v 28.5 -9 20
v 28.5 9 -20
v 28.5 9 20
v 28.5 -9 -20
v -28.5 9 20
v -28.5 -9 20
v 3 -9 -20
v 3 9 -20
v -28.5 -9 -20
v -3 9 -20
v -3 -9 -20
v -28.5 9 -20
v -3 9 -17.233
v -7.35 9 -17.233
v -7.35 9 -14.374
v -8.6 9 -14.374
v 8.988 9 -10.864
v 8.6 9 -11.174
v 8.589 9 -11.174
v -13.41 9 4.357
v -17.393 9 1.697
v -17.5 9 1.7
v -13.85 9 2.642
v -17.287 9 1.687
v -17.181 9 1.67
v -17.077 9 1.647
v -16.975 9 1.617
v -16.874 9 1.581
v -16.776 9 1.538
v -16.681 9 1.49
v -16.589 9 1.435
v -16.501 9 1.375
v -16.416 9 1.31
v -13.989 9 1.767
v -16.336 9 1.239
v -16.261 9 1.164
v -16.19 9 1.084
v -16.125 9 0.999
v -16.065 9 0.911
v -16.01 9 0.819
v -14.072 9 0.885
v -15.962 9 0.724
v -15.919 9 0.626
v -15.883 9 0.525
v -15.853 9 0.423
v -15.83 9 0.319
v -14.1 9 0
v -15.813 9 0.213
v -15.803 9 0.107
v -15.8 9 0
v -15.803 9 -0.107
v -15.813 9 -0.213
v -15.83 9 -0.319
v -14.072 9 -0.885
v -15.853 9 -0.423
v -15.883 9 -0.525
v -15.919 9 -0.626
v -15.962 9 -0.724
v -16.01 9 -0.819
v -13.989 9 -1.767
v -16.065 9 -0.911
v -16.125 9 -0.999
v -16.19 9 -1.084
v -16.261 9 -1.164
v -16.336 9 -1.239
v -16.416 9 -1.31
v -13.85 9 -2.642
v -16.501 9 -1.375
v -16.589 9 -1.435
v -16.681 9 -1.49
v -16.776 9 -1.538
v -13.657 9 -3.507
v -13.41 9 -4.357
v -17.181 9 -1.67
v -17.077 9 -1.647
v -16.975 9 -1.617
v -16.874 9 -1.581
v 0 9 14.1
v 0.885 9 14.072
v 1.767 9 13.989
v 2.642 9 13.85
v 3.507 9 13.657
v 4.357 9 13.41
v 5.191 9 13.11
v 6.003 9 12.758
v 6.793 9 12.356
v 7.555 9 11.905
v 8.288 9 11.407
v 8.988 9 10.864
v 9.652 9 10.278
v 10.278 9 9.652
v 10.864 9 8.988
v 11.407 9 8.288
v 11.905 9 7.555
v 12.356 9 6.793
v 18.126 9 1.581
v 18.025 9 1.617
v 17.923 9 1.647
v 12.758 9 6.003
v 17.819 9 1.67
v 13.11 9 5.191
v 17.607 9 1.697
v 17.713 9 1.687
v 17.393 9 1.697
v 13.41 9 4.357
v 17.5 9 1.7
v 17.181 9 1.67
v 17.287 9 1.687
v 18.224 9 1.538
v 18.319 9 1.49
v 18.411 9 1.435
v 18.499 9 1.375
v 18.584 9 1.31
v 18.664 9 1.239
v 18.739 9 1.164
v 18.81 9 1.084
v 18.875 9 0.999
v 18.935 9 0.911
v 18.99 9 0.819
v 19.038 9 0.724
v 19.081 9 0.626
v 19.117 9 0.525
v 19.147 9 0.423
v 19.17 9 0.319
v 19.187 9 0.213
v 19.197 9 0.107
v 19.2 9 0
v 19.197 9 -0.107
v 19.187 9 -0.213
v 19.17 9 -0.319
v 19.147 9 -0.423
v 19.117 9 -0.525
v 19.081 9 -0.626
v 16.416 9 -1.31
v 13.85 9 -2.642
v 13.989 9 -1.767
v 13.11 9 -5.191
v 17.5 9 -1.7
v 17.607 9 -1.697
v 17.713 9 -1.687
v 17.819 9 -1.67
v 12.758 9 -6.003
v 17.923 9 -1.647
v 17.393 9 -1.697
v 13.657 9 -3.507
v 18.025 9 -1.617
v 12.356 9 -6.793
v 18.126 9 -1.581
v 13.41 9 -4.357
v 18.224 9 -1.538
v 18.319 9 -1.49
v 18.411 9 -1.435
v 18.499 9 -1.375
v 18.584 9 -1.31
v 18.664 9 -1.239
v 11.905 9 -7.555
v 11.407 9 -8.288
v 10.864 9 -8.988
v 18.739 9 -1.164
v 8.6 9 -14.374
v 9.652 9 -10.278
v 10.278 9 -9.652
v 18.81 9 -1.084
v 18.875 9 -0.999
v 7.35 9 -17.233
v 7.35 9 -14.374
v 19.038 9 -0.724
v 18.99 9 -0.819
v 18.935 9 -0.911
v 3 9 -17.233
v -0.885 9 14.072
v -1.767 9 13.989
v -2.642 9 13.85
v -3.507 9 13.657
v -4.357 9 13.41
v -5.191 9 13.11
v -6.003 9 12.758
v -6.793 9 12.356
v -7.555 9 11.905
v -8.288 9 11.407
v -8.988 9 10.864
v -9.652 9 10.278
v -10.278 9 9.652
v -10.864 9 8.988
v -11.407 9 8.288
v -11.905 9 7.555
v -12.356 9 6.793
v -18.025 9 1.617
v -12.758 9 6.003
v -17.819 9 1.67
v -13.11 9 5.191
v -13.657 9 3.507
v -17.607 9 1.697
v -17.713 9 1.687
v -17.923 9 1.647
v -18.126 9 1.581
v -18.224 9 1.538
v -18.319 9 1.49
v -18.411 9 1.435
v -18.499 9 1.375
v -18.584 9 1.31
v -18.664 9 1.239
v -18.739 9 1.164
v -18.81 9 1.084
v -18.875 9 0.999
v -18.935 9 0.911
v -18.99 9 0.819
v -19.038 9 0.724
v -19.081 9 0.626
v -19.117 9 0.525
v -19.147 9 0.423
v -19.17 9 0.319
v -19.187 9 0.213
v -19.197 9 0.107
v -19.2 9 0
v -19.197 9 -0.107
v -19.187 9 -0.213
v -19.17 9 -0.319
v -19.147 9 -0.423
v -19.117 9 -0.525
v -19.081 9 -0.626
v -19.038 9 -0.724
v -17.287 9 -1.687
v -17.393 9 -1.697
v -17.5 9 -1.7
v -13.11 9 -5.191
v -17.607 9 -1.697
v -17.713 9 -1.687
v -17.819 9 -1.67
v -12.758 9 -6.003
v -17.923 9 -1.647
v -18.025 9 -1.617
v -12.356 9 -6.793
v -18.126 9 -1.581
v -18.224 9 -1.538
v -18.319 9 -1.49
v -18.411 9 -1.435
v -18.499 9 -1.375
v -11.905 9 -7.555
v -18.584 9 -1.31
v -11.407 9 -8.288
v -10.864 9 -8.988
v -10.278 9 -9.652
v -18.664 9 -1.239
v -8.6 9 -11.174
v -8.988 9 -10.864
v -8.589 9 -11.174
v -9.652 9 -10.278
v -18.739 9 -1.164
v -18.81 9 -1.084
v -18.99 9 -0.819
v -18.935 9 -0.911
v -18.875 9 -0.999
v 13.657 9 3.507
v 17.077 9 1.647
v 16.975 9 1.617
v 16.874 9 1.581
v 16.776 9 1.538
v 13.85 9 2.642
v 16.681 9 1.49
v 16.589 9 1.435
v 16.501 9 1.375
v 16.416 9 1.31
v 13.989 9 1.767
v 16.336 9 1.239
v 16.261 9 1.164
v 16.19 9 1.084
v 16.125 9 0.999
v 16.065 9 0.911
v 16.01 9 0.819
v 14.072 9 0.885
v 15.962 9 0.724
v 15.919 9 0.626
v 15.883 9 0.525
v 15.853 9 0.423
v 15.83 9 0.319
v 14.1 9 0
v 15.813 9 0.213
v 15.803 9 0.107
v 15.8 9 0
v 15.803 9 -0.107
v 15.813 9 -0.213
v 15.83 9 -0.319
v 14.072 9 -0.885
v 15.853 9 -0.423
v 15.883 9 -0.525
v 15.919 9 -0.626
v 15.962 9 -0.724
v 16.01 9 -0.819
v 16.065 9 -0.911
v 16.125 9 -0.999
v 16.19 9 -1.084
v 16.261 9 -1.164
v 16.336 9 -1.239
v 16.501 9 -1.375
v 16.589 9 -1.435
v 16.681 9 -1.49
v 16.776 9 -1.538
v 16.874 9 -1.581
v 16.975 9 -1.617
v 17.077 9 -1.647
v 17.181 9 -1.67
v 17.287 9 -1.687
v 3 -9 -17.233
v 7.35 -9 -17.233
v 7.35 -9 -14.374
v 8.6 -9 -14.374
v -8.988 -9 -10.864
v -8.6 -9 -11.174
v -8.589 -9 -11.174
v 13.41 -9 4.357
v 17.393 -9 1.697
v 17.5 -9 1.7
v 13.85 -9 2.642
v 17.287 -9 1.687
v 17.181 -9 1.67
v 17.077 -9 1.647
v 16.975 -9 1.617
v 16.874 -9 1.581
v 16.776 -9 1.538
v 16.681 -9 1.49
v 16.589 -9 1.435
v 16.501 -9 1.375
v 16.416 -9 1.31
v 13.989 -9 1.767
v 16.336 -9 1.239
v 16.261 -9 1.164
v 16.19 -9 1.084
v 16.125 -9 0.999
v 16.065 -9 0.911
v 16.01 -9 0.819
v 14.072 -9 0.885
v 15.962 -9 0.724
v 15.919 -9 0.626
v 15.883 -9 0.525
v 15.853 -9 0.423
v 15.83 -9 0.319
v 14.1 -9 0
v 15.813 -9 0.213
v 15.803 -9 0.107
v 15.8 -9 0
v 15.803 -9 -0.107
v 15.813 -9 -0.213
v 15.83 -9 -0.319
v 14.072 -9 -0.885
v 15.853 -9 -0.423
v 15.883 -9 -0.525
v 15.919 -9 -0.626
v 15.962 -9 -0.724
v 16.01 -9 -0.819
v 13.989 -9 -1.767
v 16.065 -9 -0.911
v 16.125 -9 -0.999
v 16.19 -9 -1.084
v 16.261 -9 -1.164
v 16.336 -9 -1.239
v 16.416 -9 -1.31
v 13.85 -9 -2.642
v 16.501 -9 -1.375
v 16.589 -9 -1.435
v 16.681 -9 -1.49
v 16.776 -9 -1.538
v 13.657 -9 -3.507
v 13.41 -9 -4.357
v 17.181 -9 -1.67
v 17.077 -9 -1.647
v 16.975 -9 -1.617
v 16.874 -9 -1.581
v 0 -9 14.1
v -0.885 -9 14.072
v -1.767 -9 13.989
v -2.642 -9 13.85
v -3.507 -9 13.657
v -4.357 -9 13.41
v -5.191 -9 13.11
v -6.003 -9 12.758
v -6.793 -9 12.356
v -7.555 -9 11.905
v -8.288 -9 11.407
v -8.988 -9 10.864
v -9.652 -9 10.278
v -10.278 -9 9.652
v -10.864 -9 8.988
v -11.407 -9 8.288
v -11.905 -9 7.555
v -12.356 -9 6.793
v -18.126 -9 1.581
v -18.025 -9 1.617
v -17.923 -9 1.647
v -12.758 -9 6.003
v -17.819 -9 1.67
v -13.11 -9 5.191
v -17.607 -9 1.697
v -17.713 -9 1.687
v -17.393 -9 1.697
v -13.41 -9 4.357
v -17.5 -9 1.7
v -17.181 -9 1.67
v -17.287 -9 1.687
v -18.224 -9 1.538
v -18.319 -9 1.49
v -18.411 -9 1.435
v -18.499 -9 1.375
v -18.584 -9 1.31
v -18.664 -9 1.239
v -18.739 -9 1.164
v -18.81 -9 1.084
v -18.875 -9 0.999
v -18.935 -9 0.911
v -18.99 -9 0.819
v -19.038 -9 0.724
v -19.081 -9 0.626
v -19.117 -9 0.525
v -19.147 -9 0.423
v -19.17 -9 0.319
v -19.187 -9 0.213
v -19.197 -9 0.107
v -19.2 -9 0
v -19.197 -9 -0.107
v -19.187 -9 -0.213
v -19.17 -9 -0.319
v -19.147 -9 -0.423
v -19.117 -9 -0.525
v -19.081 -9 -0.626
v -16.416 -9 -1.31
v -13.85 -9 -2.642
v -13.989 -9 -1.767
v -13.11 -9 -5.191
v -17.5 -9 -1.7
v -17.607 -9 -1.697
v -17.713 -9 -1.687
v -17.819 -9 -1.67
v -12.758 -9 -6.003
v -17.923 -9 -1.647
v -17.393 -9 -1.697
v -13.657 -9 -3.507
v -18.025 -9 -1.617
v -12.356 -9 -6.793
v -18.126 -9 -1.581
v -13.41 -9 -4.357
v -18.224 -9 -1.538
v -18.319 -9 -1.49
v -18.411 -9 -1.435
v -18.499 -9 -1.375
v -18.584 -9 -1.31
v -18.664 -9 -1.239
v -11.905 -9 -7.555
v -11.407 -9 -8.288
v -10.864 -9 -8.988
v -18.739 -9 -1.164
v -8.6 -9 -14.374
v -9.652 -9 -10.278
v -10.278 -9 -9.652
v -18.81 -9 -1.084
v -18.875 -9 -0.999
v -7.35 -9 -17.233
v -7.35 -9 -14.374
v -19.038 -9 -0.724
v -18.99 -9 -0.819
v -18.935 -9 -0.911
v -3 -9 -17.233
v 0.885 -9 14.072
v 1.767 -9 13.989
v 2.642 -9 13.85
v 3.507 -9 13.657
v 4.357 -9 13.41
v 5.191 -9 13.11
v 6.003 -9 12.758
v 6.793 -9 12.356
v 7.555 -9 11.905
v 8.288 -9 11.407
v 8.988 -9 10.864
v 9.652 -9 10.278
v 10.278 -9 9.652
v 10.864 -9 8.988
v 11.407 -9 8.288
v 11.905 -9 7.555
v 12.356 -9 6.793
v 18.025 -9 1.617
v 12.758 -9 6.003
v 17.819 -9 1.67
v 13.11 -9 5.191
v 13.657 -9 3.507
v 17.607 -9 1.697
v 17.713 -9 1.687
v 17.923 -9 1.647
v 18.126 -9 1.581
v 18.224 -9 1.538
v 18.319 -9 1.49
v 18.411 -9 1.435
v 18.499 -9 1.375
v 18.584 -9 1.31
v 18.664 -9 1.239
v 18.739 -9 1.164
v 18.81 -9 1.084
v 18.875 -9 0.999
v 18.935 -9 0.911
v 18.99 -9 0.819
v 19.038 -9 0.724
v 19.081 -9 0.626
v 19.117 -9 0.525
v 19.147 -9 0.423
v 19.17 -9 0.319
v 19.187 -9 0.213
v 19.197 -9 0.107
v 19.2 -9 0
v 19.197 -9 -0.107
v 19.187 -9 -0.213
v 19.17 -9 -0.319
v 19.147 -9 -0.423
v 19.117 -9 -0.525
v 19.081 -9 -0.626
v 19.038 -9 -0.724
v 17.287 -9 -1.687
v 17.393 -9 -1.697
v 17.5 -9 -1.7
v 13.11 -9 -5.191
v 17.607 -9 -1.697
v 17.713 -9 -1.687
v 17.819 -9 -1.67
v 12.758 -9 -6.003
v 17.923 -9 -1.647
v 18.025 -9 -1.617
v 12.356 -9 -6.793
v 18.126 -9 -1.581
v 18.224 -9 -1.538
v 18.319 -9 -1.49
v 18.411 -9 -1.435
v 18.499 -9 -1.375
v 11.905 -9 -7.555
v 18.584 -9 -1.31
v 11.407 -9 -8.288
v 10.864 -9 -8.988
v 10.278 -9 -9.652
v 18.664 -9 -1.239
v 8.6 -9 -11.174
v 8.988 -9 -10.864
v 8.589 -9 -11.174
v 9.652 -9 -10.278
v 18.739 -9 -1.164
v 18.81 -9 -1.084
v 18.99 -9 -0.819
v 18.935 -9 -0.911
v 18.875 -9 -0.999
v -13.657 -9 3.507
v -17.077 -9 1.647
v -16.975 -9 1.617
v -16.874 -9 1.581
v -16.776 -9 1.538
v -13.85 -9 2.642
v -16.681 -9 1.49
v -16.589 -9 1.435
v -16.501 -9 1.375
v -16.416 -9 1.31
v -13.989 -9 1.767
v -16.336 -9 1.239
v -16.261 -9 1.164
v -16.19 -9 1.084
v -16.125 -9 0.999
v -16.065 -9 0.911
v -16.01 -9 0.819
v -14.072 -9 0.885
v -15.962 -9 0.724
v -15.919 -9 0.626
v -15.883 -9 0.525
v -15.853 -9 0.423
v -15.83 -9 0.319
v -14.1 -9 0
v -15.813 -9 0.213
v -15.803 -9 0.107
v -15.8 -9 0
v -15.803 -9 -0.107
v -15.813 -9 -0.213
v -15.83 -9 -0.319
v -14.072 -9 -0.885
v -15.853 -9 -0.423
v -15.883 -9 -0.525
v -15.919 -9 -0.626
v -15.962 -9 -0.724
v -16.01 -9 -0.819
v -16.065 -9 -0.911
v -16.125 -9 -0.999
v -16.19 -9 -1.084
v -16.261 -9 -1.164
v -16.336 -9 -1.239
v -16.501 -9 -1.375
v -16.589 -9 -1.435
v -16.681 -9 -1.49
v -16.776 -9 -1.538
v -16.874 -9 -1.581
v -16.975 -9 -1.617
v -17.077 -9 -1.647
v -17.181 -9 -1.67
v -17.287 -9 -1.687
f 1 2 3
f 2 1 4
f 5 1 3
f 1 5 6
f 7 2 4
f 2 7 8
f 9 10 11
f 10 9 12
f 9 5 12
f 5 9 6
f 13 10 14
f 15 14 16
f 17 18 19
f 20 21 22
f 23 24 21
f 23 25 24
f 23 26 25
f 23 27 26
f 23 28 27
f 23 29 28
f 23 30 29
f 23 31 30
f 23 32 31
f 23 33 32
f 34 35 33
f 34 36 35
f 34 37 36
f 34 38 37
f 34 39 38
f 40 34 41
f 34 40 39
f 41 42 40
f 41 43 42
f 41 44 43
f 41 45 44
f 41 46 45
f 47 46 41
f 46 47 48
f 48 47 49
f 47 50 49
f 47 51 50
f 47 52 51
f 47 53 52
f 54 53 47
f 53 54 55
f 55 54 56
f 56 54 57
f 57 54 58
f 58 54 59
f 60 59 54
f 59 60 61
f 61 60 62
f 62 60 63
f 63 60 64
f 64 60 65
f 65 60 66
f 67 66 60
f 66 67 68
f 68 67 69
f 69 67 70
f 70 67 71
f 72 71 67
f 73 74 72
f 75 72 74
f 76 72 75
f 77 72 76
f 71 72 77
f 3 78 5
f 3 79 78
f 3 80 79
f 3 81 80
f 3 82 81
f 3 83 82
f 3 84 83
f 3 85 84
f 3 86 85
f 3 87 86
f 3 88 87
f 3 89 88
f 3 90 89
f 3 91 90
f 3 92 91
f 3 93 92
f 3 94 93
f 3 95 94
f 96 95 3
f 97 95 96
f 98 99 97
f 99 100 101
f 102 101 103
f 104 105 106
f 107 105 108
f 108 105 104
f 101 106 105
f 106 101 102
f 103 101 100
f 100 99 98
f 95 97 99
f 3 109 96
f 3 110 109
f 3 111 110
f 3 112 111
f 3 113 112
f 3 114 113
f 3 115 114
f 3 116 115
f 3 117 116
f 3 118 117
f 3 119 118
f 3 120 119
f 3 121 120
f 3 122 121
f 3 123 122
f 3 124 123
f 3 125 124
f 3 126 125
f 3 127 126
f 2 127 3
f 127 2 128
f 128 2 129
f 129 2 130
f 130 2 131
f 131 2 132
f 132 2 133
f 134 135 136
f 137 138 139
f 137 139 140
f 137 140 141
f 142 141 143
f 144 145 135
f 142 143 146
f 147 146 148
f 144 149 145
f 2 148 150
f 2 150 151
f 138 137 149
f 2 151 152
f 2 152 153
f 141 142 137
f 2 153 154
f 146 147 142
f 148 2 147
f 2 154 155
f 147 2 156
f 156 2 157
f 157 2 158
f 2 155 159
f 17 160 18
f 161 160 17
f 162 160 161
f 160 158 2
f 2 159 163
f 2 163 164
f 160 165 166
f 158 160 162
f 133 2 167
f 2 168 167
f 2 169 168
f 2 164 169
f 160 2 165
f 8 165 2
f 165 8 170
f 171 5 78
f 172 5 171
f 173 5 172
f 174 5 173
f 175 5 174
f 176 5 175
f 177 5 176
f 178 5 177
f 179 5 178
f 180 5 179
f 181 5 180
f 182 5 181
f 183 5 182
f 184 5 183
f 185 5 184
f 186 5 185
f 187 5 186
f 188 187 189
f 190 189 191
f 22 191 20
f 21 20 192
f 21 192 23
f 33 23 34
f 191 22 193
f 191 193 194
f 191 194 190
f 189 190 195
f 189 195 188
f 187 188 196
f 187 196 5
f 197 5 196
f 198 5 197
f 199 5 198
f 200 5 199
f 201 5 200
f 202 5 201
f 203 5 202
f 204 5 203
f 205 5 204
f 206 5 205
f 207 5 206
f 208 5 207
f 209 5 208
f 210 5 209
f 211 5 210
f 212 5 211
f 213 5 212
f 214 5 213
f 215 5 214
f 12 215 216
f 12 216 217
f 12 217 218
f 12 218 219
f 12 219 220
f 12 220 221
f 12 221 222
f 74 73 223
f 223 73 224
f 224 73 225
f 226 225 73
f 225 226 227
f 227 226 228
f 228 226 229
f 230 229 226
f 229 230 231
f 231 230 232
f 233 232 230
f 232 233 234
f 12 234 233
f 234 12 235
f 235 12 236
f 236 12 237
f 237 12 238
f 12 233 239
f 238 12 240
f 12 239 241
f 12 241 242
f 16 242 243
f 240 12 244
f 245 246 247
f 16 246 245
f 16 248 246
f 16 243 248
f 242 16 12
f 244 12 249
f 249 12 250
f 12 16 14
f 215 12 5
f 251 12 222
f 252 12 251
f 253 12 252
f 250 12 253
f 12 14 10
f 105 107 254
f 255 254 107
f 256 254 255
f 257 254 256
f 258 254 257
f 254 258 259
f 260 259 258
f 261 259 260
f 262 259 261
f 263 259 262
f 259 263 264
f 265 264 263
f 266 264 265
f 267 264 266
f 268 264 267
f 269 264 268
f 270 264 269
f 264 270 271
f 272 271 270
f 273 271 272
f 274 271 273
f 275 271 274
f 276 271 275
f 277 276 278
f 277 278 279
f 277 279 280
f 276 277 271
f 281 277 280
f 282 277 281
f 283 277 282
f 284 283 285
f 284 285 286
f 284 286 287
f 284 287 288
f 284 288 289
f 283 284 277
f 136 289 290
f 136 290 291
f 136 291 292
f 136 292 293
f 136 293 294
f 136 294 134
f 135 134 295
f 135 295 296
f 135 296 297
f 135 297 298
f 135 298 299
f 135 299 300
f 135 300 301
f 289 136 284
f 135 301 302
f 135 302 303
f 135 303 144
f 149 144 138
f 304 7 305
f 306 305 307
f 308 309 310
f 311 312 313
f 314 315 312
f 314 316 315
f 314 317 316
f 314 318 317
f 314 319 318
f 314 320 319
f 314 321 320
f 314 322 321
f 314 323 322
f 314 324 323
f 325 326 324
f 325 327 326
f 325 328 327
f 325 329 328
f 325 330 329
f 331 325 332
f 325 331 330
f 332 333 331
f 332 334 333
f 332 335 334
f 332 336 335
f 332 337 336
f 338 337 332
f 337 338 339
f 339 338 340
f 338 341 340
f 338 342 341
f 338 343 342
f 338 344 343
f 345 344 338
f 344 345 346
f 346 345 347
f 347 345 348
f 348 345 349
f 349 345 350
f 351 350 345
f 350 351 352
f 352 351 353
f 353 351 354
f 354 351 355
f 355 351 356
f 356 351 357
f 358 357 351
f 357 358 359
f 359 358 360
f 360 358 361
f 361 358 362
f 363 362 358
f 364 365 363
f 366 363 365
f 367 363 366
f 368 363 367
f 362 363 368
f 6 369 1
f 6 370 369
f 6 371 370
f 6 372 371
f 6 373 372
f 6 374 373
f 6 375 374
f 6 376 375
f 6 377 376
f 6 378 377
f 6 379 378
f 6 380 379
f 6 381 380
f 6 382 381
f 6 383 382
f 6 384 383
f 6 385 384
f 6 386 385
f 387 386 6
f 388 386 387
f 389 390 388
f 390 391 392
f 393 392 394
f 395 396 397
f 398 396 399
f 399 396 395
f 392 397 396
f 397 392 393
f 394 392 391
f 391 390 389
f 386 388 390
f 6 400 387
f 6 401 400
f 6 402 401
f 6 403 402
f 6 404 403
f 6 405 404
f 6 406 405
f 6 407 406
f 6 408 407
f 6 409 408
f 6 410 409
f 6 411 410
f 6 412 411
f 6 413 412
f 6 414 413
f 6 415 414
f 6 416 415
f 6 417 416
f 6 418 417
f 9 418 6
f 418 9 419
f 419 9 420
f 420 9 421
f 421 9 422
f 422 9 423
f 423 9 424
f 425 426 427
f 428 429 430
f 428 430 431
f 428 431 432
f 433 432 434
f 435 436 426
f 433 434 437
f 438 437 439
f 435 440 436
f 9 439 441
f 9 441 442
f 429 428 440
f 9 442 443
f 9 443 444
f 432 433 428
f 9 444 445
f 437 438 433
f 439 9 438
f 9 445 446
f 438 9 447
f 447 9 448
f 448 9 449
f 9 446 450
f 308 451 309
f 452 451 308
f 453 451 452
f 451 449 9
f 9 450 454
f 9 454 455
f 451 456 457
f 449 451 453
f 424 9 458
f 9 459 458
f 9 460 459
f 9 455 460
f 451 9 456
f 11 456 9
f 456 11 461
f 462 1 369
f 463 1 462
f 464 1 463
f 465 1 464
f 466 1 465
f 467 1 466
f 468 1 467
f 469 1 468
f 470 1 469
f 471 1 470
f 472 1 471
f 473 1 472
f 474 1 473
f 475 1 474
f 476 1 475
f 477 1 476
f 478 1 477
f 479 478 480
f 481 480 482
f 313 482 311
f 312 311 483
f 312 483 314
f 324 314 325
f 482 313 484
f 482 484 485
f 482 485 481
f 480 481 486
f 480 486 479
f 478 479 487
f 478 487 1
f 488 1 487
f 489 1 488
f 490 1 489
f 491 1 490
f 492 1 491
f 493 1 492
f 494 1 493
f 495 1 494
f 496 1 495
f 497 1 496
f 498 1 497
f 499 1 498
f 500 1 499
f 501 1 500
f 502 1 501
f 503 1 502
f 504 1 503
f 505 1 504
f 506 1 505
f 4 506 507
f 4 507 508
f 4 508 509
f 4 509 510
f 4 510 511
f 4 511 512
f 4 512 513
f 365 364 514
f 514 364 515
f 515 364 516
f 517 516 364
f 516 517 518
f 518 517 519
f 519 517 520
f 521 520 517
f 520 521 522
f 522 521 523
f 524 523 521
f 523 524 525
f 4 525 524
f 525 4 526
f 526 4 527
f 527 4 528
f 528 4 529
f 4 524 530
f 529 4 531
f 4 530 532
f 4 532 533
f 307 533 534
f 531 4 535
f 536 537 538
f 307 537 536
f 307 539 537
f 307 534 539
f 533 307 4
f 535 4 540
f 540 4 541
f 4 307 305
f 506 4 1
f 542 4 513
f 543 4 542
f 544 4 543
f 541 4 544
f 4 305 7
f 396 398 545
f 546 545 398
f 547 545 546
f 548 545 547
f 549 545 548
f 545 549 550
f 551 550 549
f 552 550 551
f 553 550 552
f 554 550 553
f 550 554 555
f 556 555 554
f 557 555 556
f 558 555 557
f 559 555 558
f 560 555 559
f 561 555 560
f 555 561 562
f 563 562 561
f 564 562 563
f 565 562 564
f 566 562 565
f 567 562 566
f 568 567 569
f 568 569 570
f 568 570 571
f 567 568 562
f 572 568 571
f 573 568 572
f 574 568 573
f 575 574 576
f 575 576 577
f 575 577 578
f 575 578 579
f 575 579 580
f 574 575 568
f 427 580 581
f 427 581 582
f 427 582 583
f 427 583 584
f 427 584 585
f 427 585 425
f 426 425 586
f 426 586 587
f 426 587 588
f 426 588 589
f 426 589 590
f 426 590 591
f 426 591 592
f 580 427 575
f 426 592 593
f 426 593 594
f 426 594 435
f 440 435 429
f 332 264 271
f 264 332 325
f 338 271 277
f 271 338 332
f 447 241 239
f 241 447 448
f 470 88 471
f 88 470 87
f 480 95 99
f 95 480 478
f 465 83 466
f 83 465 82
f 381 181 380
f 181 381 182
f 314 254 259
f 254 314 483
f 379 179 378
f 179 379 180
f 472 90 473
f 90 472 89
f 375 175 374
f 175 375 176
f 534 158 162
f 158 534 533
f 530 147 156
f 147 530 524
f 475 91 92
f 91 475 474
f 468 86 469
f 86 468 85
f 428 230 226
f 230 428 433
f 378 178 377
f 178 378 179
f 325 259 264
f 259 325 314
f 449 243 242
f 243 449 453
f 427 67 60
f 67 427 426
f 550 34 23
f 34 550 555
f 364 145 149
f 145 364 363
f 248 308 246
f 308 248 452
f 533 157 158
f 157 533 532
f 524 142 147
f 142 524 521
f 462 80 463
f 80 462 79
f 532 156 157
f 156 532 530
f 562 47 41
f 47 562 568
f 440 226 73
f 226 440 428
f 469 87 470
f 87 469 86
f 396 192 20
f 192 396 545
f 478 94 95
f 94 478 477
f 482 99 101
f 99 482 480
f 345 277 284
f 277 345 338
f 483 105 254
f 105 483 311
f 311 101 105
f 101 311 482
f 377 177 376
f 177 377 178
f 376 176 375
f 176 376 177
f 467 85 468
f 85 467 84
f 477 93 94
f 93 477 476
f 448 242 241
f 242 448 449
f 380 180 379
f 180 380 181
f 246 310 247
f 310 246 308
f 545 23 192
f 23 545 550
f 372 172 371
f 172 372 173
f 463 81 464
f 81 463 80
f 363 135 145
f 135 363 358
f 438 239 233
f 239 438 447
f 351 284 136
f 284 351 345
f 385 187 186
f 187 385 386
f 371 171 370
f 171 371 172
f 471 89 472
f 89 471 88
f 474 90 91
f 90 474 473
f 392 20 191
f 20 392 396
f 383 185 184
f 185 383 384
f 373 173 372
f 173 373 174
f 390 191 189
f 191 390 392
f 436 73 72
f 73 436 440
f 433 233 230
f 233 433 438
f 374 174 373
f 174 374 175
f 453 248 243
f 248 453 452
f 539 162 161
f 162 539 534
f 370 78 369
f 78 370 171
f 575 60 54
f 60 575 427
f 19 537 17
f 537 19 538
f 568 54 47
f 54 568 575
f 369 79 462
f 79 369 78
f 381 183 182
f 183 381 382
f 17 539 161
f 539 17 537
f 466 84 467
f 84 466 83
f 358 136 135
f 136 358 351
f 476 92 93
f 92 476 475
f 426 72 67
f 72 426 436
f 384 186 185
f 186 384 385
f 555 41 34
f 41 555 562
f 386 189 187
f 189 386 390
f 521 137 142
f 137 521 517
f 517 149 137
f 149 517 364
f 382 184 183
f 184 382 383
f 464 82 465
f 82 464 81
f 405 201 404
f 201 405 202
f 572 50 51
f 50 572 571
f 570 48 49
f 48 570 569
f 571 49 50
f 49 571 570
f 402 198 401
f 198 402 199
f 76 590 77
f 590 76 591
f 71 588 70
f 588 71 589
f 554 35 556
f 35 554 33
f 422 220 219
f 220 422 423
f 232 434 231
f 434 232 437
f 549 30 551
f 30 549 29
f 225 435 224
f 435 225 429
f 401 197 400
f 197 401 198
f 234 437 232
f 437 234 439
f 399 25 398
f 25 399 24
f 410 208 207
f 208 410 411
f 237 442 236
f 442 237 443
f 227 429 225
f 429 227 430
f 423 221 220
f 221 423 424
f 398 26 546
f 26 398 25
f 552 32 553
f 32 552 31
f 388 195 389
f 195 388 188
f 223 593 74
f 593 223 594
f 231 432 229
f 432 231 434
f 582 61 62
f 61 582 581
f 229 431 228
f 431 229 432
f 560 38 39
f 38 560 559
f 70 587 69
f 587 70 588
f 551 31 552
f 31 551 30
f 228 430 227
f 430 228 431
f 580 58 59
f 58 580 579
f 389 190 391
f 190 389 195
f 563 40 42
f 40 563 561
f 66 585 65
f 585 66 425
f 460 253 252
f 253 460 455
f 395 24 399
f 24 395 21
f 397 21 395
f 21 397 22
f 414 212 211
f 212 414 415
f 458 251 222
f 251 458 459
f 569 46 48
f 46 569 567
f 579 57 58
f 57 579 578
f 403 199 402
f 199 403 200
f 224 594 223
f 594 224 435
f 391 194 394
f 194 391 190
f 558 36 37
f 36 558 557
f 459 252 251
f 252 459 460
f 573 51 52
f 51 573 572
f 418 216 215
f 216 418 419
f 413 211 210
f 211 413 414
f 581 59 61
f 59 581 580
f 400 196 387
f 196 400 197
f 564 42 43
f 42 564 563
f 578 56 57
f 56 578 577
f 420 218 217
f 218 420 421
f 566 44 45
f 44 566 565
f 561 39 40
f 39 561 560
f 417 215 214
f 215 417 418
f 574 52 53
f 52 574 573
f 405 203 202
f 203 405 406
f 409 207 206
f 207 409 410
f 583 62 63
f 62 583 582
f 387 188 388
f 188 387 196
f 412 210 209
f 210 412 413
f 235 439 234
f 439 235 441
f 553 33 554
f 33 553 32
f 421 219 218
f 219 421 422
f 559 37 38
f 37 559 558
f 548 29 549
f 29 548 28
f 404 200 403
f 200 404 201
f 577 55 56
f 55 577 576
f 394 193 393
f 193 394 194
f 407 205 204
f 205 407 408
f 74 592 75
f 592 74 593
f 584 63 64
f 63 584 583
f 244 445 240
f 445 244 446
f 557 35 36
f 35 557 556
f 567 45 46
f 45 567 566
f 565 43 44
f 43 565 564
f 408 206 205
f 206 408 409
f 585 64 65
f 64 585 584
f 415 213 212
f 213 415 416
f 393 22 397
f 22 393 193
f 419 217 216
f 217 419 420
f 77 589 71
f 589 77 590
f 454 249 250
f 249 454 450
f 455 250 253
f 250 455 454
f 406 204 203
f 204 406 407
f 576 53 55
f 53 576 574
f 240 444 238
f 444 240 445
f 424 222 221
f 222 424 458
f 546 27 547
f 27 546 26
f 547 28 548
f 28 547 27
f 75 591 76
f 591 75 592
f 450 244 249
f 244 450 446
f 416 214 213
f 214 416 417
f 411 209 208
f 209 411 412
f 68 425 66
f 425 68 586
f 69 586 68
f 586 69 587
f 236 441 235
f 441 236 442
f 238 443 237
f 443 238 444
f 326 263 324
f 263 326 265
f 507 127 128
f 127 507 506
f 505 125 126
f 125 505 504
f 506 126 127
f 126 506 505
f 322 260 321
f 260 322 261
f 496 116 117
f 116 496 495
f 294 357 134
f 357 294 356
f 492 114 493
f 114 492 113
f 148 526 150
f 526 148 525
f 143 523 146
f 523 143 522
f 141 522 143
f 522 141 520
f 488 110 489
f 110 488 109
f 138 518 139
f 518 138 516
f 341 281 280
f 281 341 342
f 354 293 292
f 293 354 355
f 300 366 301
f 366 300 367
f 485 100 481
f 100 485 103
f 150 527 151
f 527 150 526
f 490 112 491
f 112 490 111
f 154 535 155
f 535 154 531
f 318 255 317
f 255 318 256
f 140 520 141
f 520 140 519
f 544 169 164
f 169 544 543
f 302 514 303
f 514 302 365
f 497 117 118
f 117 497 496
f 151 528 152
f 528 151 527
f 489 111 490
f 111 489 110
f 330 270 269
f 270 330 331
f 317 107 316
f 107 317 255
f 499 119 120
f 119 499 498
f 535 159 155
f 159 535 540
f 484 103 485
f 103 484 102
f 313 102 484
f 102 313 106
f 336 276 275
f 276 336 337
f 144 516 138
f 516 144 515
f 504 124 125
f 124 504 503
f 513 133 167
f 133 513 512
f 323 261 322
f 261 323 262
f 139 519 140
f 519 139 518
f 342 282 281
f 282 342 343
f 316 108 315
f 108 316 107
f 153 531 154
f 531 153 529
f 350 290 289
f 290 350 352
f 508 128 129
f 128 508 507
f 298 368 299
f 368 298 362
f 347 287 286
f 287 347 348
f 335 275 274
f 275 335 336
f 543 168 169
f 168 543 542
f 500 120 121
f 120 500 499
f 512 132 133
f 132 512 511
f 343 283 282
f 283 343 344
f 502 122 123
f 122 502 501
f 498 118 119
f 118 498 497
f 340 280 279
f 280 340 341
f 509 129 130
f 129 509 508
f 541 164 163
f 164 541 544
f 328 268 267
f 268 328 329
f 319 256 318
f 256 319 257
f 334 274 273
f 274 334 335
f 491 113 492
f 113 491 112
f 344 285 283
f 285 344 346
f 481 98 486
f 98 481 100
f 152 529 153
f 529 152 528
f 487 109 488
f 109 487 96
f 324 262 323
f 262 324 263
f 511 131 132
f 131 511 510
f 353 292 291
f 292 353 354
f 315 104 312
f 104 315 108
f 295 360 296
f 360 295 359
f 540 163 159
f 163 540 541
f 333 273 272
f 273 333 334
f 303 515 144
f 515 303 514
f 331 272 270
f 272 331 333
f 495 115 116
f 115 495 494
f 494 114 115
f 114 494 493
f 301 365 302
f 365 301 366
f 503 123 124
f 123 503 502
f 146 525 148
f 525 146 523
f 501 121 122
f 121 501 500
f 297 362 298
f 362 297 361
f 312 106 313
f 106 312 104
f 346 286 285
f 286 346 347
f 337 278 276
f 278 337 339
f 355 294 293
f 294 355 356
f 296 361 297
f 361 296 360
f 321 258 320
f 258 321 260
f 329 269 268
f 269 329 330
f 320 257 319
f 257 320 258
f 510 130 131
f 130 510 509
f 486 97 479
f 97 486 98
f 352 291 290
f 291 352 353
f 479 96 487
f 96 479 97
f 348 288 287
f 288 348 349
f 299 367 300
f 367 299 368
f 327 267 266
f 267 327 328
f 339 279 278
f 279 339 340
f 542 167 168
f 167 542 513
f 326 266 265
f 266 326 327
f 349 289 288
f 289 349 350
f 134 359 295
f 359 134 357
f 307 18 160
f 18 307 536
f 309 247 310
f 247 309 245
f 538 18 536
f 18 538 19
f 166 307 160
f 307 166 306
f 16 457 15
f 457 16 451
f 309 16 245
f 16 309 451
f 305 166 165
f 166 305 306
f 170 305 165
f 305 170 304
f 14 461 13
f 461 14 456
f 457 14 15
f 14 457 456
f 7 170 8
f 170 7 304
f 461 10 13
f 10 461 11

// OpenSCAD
$fn = 100;  // Resolucion del modelo

// Dimensiones exteriores del montaje
W = 57;     // Ancho (en direccion X)
L = 18;     // Largo (en direccion Y)
H = 40;     // Alto (en direccion Z)

Ry = 4.1;   // Radio del orificio para eje y

ls = 4;     // Espesor de pared posterior
ds = 8;     // Ancho hacia los costados
Rs = 2.25;  // Radio de los agujeros para soportes

// Dimensiones del motor
Rm = 14+0.1; // Radio del motor
r2 = 1.7; // Radio de los agujeros para tornillos
d2 = 35; // Separacion entre los tornillos

// Espacio para soporte de cables
wc1 = 3+0.2; // Largo parte ancha
lc1 = 17+0.2; // Ancho parte ancha
xc1 = sqrt(Rm*Rm-lc1*lc1/4)+wc1/2; // Posicion del centro del cuadrado
wc2 = 5+0.2; // Largo parte angosta
lc2 = 14.5+0.2; // Ancho parte angosta
xc2 = sqrt(Rm*Rm-lc2*lc2/4)+wc2/2; // Posicion del centro del cuadrado
wc3 = 7; // Largo parte angosta
lc3 = 6; // Ancho parte angosta
xc3 = sqrt(Rm*Rm-lc3*lc3/4)+wc3/2; // Posicion del centro del cuadrado

module pieza(){ 
    difference(){ 
        cube([W,L,H],center = true); // Envolvente        
        
        // Hueco para el motor
        rotate([90,0,0])
            cylinder(r = Rm, h = L, center = true);
           
        // Orificios para los tornillos del motor        
        translate([-d2/2,0,0])
        rotate([90,0,0])
            cylinder(r = r2, h = L, center = true);    
        translate([d2/2,0,0])
        rotate([90,0,0])
            cylinder(r = r2, h = L, center = true);
        
        // Espacio para los conectores del motor
        translate([0,0,-xc1])
            cube([lc1,L,wc1], center = true);
        translate([0,0,-xc2])
            cube([lc2,L,wc2], center = true);
        translate([0,0,-xc3])
            cube([lc3,L,wc3], center = true);    
    }
}

pieza();
